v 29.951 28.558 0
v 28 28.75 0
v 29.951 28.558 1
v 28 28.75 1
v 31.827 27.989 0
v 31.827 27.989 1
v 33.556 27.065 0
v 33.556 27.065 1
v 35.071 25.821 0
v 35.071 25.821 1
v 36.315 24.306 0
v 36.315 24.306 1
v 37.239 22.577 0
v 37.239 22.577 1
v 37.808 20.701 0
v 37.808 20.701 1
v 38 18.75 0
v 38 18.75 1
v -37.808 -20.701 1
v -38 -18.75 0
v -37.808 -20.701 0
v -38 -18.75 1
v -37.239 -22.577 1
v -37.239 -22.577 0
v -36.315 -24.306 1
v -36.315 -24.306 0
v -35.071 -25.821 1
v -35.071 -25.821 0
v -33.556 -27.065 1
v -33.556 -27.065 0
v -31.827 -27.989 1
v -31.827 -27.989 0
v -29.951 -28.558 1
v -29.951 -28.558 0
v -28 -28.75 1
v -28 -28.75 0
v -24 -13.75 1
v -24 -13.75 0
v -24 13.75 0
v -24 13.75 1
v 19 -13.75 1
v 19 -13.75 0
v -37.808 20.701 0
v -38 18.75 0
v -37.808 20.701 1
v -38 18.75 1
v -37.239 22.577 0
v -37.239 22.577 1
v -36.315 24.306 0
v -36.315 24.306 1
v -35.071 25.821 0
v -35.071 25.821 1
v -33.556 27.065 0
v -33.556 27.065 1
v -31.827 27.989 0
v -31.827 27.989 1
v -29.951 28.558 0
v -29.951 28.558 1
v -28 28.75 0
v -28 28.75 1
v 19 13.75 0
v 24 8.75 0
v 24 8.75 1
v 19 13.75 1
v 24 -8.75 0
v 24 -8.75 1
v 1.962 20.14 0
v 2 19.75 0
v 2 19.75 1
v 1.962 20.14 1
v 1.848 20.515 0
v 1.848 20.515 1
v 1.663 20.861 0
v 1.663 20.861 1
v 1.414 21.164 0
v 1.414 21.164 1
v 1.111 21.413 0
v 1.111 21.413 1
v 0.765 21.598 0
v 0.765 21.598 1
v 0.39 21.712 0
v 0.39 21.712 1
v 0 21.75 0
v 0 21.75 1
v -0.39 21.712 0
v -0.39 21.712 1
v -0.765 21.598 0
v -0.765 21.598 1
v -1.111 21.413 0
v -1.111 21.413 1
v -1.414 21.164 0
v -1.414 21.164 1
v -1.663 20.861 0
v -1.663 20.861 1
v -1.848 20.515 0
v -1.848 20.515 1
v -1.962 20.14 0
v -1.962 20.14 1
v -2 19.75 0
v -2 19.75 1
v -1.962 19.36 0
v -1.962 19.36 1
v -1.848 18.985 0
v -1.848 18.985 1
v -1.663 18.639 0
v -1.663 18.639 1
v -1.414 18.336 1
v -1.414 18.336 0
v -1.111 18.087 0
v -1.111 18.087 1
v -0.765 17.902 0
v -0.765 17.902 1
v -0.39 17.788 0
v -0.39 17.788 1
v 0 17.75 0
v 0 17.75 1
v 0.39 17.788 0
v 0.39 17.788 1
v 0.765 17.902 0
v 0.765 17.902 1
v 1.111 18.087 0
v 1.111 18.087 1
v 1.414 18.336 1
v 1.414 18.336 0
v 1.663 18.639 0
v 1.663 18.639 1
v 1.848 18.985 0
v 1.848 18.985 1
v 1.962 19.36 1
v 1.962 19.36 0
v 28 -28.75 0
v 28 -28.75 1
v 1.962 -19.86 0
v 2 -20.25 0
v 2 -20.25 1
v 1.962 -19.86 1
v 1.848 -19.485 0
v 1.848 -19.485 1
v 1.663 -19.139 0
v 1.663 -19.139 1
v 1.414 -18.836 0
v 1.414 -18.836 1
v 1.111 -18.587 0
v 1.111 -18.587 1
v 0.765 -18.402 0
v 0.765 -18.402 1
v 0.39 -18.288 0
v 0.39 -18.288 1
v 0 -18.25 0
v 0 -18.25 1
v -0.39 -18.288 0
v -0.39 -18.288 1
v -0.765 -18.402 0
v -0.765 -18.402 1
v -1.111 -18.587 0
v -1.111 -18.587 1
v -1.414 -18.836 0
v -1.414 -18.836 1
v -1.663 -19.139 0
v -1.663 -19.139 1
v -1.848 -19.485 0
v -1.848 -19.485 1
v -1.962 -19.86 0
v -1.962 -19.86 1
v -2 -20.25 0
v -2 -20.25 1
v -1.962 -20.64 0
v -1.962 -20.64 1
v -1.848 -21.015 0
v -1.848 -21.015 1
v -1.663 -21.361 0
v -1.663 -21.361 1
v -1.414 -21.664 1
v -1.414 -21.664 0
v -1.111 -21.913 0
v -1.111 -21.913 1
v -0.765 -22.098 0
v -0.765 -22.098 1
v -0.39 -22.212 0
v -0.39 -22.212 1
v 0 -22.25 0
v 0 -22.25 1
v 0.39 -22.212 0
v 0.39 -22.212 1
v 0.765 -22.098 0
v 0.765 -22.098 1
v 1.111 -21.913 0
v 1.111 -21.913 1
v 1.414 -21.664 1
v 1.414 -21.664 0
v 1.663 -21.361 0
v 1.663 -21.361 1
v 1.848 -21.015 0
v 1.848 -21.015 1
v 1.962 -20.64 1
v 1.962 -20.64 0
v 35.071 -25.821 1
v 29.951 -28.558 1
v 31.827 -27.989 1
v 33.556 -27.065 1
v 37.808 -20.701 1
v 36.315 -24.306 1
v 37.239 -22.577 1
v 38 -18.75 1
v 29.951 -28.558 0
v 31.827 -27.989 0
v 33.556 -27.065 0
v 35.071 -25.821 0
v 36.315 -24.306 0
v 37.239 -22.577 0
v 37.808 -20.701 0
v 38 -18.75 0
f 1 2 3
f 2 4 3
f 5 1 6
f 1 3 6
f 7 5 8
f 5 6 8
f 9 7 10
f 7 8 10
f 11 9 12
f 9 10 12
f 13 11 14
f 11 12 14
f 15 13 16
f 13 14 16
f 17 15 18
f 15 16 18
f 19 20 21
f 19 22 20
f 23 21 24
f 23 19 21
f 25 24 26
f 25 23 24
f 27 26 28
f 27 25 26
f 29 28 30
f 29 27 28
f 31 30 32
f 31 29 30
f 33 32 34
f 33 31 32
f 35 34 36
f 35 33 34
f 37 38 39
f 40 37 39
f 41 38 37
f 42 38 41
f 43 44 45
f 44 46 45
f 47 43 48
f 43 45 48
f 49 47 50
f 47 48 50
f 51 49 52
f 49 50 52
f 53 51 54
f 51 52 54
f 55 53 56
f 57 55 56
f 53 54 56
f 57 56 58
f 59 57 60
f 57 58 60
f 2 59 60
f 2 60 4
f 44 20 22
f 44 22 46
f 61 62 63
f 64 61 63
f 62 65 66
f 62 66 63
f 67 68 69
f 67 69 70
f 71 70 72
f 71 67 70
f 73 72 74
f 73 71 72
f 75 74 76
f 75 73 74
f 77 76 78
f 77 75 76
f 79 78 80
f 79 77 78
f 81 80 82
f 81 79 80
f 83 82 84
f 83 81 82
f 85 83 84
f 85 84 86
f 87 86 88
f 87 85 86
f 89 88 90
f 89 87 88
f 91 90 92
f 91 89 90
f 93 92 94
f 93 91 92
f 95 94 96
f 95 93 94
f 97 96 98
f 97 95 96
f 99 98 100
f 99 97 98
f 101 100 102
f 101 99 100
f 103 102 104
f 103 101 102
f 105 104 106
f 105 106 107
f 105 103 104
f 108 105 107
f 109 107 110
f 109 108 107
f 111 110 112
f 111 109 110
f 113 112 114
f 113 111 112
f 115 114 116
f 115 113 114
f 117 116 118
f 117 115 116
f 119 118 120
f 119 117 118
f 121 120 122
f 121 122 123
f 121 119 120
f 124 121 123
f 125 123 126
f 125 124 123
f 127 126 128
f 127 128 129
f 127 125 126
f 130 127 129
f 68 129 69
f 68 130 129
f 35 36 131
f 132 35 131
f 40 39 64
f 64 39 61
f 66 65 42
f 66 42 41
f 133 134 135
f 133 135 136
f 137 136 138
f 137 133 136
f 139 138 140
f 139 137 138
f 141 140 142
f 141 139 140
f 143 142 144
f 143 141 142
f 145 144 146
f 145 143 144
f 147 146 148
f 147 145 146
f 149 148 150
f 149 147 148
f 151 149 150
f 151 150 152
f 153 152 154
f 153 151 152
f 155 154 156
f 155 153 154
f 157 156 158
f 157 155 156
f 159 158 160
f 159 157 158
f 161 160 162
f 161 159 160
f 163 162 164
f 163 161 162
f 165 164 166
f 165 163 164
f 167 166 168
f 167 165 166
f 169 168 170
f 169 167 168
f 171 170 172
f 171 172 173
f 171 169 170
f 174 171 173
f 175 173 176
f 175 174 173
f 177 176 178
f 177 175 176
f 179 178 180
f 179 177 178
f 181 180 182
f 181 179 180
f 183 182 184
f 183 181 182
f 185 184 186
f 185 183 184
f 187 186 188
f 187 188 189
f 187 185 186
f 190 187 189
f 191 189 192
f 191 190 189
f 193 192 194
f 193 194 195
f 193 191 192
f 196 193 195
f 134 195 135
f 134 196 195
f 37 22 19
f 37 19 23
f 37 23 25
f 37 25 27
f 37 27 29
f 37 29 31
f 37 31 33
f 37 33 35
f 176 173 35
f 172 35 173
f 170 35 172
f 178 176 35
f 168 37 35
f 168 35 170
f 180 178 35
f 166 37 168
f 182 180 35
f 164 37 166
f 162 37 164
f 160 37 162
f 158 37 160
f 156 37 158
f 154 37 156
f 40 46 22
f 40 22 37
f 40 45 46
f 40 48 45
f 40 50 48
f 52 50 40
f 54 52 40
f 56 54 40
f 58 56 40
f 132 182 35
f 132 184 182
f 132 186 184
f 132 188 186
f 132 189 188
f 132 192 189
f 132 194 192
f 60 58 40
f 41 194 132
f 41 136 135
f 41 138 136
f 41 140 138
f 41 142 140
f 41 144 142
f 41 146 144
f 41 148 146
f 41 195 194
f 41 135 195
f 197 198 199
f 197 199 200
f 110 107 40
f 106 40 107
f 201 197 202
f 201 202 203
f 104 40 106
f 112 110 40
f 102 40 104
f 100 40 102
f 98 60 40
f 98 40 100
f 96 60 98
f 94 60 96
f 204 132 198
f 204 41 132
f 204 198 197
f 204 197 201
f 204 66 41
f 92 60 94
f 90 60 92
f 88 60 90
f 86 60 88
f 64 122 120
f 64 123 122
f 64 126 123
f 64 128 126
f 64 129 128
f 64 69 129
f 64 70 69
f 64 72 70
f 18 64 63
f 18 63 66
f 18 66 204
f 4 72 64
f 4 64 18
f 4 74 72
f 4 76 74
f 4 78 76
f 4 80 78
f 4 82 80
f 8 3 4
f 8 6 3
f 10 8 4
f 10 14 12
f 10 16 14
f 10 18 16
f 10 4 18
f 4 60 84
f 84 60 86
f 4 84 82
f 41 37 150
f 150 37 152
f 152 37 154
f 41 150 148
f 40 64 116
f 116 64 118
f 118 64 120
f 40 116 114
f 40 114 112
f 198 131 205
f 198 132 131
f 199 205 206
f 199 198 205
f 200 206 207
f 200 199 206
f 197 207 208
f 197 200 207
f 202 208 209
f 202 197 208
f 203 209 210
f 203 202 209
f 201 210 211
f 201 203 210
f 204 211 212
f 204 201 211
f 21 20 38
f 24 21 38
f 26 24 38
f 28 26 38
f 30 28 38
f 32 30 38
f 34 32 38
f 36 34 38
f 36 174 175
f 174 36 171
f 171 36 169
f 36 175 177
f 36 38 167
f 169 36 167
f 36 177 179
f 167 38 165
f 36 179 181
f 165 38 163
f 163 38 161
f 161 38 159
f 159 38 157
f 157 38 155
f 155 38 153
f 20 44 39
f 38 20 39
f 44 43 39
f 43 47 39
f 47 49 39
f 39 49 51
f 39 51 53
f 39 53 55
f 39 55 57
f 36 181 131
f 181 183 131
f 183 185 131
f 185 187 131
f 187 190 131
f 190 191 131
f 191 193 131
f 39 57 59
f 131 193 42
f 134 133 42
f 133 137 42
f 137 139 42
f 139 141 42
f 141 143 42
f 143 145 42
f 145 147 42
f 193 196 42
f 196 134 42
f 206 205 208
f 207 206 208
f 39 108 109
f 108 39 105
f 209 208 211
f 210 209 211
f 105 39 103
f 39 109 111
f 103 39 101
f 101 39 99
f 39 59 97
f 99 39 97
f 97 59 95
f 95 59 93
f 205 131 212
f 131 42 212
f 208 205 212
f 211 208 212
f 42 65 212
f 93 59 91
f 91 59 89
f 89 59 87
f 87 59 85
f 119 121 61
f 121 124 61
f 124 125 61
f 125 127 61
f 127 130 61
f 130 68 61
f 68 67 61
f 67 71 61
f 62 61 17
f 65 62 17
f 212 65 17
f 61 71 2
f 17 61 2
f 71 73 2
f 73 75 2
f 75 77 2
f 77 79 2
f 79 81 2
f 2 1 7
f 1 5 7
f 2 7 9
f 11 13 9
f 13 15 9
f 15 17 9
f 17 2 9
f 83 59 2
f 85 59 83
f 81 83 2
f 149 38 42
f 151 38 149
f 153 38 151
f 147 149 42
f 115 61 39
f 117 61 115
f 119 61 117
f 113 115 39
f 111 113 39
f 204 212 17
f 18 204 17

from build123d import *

# Parameters (mm, degrees)
F0_W     = 76
F0_H     = 57.5
F0_R     = 2
F0_W_2   = 48
F0_H_2   = 27.5
F1_DEPTH = 1
F2_R     = 10
F3_SIZE  = 5


with BuildPart() as f1:
    # F0 (on Top) → F1 (new body)
    with BuildSketch(Plane.XY):
        Rectangle(F0_W, F0_H)
        with Locations((0, -20.25)):
            Circle(F0_R, mode=Mode.SUBTRACT)
        Rectangle(F0_W_2, F0_H_2, mode=Mode.SUBTRACT)
        with Locations((0, 19.75)):
            Circle(F0_R, mode=Mode.SUBTRACT)
    extrude(amount=F1_DEPTH)

    # F2
    f2_edges = [f1.edges().sort_by_distance(p)[0] for p in [
        (-38, 28.75, 0.5),
        (-38, -28.75, 0.5),
        (38, 28.75, 0.5),
        (38, -28.75, 0.5),
    ]]
    fillet(f2_edges, radius=F2_R)

    # F3
    f3_edges = [f1.edges().sort_by_distance(p)[0] for p in [
        (24, 13.75, 0.5),
        (24, -13.75, 0.5),
    ]]
    chamfer(f3_edges, length=F3_SIZE)


solid = f1.part
